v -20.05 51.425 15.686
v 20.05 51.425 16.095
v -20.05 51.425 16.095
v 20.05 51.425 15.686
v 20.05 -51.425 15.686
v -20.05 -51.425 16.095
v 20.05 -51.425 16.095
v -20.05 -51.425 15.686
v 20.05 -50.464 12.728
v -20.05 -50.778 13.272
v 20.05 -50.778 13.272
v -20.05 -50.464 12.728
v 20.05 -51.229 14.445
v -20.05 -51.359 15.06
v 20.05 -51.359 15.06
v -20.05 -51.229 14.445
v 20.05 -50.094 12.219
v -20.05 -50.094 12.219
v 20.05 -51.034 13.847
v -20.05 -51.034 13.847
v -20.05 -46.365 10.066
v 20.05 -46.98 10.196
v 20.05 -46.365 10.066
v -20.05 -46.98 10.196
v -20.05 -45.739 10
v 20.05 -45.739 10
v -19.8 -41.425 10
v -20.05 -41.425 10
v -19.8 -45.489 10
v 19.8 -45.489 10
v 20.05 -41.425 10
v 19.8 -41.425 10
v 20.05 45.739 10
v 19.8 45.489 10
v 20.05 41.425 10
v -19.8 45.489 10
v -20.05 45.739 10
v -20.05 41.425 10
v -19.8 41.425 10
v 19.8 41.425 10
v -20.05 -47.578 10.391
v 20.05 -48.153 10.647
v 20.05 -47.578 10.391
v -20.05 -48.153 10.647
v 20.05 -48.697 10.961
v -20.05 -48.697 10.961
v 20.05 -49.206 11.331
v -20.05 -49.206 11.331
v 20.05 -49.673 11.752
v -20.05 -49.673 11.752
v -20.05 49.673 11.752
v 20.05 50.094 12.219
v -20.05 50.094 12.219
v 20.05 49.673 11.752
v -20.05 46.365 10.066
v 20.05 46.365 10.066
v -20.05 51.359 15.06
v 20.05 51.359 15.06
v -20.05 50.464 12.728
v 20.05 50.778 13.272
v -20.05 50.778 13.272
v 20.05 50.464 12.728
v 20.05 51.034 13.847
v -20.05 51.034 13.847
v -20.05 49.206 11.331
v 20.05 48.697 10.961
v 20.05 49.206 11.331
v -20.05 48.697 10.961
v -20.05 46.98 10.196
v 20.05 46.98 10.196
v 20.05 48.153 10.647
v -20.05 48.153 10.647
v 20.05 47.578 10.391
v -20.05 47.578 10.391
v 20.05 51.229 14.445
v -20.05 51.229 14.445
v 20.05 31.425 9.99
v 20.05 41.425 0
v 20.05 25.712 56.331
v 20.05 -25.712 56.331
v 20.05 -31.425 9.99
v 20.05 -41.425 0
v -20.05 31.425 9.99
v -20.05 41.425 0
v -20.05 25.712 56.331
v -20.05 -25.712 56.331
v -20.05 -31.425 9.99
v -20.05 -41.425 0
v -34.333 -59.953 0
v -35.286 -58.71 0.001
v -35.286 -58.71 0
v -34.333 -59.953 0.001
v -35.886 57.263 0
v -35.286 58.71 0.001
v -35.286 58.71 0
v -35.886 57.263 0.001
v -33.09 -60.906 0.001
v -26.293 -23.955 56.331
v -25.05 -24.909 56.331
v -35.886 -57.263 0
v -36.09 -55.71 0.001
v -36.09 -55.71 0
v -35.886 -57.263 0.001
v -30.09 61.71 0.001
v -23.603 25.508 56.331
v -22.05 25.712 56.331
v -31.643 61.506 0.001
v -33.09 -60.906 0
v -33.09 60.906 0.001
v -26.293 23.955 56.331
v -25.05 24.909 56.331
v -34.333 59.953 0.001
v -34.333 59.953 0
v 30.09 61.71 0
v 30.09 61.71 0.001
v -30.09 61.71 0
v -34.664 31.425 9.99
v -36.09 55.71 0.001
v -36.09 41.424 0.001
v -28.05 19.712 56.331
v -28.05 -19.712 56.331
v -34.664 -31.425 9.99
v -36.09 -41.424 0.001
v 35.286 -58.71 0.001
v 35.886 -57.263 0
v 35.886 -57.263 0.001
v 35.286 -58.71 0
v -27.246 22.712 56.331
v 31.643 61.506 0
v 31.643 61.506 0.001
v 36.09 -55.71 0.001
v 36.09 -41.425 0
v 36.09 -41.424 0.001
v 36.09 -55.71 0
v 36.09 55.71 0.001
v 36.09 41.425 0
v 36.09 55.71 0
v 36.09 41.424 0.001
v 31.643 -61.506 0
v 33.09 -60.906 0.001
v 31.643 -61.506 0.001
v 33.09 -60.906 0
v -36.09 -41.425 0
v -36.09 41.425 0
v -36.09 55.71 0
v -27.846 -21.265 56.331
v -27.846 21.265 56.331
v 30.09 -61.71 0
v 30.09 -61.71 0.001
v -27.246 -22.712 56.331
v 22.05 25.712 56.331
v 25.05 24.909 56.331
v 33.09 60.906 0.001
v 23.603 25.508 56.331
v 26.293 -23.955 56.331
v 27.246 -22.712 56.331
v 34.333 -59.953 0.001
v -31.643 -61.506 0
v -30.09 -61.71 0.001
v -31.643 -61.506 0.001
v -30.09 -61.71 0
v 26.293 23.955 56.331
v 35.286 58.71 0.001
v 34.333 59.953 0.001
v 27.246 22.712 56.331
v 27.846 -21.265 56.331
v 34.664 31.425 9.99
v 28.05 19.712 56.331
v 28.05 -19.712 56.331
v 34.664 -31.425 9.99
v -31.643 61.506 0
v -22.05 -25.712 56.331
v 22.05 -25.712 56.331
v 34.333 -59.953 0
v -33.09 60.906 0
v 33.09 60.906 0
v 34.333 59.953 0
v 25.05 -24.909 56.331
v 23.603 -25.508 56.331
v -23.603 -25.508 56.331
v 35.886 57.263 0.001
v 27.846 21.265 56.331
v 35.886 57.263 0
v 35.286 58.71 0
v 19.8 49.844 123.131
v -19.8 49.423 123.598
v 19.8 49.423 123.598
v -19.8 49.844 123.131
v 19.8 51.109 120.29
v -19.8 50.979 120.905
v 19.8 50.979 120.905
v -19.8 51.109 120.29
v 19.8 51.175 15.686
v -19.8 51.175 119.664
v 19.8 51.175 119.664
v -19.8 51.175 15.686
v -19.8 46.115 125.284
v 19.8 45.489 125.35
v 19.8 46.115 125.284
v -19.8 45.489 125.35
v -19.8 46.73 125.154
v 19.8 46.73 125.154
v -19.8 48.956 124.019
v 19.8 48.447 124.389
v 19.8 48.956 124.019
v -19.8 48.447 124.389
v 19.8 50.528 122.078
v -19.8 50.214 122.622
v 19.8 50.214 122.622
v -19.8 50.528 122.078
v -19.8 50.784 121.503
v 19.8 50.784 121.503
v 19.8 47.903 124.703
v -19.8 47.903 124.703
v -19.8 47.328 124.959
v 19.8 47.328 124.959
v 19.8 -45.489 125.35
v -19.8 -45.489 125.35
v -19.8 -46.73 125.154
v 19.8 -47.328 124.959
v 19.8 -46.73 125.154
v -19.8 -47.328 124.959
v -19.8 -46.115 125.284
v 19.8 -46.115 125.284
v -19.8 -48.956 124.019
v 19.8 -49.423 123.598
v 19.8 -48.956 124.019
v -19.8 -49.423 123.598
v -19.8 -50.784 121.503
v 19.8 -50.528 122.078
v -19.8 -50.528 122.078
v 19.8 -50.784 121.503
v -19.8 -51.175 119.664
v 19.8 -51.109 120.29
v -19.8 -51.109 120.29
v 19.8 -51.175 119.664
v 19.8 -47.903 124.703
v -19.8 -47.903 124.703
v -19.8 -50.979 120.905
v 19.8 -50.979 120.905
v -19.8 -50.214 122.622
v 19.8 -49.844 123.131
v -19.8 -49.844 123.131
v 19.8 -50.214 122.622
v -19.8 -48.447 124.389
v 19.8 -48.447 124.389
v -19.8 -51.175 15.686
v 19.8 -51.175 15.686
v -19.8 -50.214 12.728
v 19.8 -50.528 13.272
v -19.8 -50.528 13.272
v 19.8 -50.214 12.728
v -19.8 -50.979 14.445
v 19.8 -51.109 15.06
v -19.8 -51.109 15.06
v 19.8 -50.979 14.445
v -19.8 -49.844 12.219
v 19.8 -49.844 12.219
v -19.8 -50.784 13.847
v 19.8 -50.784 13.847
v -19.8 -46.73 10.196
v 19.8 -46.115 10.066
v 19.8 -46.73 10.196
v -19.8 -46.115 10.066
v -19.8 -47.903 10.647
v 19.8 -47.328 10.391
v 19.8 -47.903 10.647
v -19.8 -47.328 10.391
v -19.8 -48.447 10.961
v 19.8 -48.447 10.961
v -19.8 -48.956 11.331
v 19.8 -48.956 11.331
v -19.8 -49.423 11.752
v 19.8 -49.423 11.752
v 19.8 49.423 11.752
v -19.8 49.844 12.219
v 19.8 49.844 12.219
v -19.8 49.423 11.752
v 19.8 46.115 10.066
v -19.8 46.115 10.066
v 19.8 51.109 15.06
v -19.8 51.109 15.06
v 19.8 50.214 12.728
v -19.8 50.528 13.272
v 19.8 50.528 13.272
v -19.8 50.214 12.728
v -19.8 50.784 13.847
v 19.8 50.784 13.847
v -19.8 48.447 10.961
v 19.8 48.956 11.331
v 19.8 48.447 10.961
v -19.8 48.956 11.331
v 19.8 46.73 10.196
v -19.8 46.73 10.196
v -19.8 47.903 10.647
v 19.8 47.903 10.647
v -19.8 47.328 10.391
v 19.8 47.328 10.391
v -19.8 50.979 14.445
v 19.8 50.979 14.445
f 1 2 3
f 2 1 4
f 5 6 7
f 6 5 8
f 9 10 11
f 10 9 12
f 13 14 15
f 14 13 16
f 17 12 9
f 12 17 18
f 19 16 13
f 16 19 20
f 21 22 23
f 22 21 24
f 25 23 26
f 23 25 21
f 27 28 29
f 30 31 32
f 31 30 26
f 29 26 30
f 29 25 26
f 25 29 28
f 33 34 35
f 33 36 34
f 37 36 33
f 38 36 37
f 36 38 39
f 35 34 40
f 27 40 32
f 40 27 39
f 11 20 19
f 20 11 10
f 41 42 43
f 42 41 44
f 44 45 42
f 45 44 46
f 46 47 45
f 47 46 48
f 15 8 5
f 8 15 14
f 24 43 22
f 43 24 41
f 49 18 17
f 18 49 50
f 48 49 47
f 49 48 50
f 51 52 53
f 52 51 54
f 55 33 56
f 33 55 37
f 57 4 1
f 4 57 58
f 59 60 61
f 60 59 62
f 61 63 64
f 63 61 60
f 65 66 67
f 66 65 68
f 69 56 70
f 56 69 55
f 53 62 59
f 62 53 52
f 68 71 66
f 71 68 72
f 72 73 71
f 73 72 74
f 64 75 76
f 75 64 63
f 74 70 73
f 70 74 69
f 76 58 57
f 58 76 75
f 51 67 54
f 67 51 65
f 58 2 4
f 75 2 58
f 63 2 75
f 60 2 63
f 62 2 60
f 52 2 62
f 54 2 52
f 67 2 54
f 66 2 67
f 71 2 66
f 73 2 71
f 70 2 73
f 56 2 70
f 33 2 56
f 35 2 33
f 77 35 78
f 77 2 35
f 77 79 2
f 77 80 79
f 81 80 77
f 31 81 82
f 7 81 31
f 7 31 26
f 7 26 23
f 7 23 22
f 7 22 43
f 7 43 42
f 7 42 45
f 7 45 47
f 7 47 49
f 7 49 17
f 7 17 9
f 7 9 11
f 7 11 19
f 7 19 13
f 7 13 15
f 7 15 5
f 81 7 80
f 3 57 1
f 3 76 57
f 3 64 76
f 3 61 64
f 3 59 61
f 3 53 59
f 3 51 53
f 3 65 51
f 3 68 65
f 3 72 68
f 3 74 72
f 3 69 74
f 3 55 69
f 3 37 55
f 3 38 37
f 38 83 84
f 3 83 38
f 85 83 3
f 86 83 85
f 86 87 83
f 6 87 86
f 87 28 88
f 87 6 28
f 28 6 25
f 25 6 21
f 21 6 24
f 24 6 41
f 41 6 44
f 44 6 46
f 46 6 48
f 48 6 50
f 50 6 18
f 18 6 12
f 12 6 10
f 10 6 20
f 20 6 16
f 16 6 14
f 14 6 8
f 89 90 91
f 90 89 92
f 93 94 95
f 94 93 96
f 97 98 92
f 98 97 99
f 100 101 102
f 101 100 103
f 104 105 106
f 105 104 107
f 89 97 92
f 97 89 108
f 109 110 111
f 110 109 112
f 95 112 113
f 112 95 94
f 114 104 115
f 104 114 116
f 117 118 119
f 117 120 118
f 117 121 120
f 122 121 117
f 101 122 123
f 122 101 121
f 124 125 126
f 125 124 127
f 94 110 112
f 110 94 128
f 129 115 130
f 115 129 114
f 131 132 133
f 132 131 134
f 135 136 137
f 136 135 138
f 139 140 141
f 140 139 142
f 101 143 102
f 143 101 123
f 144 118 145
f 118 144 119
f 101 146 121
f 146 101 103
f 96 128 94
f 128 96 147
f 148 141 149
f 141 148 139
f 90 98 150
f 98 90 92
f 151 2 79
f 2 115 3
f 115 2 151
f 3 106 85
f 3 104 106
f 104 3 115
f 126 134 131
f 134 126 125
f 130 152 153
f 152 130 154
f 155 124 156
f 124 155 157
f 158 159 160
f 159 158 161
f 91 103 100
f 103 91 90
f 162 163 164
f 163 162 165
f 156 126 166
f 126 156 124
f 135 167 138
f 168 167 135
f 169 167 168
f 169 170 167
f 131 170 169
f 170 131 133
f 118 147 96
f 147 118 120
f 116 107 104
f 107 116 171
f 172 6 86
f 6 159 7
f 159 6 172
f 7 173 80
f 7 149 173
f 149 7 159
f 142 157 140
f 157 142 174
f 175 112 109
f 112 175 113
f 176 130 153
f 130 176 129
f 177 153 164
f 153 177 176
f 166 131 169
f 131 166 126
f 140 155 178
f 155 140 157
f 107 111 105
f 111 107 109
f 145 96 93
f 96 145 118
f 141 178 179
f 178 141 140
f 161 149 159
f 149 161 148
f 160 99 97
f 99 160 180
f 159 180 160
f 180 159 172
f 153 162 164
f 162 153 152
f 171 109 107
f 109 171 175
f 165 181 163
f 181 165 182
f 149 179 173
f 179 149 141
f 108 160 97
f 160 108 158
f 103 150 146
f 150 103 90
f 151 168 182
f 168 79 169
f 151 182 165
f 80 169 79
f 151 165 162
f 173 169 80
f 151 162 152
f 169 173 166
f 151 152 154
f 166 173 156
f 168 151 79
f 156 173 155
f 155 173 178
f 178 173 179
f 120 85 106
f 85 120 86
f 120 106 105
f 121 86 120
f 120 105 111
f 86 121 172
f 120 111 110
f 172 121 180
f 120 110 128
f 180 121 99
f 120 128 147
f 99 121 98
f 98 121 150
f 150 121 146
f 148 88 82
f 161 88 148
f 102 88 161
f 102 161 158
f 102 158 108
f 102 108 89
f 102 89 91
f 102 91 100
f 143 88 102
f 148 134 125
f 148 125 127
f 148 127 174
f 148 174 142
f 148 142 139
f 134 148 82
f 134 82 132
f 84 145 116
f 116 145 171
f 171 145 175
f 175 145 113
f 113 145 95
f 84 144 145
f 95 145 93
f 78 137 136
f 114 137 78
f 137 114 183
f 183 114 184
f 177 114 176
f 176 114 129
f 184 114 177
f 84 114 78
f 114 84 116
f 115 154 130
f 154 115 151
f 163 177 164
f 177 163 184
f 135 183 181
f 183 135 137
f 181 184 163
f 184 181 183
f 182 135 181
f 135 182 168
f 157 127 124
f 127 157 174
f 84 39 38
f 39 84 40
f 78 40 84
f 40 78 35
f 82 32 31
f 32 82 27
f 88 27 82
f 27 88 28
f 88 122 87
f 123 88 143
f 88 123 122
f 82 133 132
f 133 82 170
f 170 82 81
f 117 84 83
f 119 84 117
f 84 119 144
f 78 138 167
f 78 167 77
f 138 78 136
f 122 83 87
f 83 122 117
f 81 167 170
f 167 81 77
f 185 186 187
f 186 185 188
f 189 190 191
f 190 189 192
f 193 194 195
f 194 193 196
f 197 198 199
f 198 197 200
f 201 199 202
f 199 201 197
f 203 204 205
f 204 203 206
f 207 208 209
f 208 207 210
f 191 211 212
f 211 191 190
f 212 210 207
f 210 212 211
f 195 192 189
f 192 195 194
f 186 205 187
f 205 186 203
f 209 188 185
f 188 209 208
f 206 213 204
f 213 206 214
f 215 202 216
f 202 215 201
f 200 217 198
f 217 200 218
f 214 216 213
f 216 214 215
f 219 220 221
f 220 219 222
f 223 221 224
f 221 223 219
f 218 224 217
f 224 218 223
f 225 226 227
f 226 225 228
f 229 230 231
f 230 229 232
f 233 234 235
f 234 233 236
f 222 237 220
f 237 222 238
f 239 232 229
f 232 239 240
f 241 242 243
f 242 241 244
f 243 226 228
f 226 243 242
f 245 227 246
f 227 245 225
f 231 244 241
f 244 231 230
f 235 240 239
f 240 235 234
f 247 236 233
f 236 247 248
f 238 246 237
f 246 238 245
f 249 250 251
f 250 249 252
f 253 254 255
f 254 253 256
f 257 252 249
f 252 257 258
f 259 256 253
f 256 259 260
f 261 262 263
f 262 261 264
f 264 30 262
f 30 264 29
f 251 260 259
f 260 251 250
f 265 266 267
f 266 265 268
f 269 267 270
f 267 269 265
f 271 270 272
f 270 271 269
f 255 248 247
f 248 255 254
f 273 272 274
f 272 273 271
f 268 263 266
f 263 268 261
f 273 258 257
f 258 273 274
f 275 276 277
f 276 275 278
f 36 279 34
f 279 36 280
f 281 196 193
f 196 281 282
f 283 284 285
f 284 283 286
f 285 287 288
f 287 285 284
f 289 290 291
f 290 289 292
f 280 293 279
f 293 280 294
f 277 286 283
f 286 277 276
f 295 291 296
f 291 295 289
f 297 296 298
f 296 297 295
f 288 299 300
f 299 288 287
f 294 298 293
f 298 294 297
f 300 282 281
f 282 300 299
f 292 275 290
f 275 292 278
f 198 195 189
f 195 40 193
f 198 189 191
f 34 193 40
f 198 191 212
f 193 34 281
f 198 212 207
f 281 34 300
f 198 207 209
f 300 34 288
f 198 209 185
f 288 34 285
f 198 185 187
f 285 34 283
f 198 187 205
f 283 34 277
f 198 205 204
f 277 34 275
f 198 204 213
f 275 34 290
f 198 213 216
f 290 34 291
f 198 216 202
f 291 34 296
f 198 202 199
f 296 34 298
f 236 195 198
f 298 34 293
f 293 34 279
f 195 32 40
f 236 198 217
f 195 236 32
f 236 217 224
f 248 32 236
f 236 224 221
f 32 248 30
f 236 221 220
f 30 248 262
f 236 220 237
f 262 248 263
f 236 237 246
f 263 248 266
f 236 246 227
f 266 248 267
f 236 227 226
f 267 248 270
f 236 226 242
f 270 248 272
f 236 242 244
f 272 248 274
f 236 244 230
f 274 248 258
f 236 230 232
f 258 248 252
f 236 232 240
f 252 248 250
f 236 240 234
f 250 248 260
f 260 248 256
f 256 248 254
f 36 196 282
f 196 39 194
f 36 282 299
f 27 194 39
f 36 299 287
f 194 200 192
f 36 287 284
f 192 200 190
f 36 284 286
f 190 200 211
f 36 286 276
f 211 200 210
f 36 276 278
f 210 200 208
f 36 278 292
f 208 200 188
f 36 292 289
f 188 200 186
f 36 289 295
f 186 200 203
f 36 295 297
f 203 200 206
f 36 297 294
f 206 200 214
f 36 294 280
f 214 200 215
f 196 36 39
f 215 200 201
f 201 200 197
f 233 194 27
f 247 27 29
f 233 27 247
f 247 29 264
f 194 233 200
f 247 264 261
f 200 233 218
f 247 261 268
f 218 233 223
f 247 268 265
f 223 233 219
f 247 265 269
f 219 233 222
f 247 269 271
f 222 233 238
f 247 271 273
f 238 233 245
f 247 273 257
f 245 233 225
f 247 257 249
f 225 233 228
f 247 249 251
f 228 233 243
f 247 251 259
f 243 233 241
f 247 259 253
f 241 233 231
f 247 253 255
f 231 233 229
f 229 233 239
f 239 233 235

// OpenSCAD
// Beelink Mini S12 Pro Vertical Desktop Stand
// 2023 Matt Klapman

// OpenSCAD units are millimeters

$fn=60; // number of resolved facets on curves

include <BOSL/constants.scad>
use <BOSL/shapes.scad>

wallThickness = 8;

clearance = 0.5; // allow some space as 3D printing isn't perfect

// from a horizontal view looking at the front
miniWidth = 115.35 + clearance;  // measurement left to right
miniLength = 102.35 + clearance; // measurement front to back
//mini12Height = 38.25 + clearance; // without feet
miniHeight = 39.6 + clearance; // with feet
miniRadial = 6; // corners (eyeballed)

miniLedge = 10; // from each outer edge of mini to not block vents
bottomAirGap = 10; // height off of the desk

renderHelp = 0.001; // used during development to correct visual artifacts in OpenSCAD (OK to print with this)

module stand()
{
    difference()
    {
        translate([0, 0, 0]) rounded_prismoid(size1=[1.8 * miniHeight, 1.2 * miniLength], size2=[miniHeight + 2 * wallThickness, 0.5 * miniLength], h=bottomAirGap + 0.4 * miniWidth, r=miniRadial, $fn=24);
        {
        // cut out mini
        translate([0, 0, bottomAirGap + miniWidth/2]) cuboid([miniHeight, miniLength, miniWidth], center=true, fillet=6, edges=EDGES_X_ALL);
        // cut out hole below mini
        translate([0, 0, 0]) cube([miniHeight, miniLength - 2 * miniLedge, miniWidth * 2], center=true);
        // cut out bottom side vents
        translate([0, 0, -renderHelp]) rounded_prismoid(size1=[4 * miniHeight, miniLength - 2 * miniLedge], size2=[4 * miniHeight, miniLength - 4 * miniLedge], h=1.0 * bottomAirGap, r=miniRadial, $fn=24);
        }
    }
}

stand();
color("blue") translate([0, 0, bottomAirGap + (miniWidth - clearance)/2]) cuboid([miniHeight - clearance, miniLength - clearance, miniWidth - clearance], center=true, fillet=6, edges=EDGES_X_ALL);
